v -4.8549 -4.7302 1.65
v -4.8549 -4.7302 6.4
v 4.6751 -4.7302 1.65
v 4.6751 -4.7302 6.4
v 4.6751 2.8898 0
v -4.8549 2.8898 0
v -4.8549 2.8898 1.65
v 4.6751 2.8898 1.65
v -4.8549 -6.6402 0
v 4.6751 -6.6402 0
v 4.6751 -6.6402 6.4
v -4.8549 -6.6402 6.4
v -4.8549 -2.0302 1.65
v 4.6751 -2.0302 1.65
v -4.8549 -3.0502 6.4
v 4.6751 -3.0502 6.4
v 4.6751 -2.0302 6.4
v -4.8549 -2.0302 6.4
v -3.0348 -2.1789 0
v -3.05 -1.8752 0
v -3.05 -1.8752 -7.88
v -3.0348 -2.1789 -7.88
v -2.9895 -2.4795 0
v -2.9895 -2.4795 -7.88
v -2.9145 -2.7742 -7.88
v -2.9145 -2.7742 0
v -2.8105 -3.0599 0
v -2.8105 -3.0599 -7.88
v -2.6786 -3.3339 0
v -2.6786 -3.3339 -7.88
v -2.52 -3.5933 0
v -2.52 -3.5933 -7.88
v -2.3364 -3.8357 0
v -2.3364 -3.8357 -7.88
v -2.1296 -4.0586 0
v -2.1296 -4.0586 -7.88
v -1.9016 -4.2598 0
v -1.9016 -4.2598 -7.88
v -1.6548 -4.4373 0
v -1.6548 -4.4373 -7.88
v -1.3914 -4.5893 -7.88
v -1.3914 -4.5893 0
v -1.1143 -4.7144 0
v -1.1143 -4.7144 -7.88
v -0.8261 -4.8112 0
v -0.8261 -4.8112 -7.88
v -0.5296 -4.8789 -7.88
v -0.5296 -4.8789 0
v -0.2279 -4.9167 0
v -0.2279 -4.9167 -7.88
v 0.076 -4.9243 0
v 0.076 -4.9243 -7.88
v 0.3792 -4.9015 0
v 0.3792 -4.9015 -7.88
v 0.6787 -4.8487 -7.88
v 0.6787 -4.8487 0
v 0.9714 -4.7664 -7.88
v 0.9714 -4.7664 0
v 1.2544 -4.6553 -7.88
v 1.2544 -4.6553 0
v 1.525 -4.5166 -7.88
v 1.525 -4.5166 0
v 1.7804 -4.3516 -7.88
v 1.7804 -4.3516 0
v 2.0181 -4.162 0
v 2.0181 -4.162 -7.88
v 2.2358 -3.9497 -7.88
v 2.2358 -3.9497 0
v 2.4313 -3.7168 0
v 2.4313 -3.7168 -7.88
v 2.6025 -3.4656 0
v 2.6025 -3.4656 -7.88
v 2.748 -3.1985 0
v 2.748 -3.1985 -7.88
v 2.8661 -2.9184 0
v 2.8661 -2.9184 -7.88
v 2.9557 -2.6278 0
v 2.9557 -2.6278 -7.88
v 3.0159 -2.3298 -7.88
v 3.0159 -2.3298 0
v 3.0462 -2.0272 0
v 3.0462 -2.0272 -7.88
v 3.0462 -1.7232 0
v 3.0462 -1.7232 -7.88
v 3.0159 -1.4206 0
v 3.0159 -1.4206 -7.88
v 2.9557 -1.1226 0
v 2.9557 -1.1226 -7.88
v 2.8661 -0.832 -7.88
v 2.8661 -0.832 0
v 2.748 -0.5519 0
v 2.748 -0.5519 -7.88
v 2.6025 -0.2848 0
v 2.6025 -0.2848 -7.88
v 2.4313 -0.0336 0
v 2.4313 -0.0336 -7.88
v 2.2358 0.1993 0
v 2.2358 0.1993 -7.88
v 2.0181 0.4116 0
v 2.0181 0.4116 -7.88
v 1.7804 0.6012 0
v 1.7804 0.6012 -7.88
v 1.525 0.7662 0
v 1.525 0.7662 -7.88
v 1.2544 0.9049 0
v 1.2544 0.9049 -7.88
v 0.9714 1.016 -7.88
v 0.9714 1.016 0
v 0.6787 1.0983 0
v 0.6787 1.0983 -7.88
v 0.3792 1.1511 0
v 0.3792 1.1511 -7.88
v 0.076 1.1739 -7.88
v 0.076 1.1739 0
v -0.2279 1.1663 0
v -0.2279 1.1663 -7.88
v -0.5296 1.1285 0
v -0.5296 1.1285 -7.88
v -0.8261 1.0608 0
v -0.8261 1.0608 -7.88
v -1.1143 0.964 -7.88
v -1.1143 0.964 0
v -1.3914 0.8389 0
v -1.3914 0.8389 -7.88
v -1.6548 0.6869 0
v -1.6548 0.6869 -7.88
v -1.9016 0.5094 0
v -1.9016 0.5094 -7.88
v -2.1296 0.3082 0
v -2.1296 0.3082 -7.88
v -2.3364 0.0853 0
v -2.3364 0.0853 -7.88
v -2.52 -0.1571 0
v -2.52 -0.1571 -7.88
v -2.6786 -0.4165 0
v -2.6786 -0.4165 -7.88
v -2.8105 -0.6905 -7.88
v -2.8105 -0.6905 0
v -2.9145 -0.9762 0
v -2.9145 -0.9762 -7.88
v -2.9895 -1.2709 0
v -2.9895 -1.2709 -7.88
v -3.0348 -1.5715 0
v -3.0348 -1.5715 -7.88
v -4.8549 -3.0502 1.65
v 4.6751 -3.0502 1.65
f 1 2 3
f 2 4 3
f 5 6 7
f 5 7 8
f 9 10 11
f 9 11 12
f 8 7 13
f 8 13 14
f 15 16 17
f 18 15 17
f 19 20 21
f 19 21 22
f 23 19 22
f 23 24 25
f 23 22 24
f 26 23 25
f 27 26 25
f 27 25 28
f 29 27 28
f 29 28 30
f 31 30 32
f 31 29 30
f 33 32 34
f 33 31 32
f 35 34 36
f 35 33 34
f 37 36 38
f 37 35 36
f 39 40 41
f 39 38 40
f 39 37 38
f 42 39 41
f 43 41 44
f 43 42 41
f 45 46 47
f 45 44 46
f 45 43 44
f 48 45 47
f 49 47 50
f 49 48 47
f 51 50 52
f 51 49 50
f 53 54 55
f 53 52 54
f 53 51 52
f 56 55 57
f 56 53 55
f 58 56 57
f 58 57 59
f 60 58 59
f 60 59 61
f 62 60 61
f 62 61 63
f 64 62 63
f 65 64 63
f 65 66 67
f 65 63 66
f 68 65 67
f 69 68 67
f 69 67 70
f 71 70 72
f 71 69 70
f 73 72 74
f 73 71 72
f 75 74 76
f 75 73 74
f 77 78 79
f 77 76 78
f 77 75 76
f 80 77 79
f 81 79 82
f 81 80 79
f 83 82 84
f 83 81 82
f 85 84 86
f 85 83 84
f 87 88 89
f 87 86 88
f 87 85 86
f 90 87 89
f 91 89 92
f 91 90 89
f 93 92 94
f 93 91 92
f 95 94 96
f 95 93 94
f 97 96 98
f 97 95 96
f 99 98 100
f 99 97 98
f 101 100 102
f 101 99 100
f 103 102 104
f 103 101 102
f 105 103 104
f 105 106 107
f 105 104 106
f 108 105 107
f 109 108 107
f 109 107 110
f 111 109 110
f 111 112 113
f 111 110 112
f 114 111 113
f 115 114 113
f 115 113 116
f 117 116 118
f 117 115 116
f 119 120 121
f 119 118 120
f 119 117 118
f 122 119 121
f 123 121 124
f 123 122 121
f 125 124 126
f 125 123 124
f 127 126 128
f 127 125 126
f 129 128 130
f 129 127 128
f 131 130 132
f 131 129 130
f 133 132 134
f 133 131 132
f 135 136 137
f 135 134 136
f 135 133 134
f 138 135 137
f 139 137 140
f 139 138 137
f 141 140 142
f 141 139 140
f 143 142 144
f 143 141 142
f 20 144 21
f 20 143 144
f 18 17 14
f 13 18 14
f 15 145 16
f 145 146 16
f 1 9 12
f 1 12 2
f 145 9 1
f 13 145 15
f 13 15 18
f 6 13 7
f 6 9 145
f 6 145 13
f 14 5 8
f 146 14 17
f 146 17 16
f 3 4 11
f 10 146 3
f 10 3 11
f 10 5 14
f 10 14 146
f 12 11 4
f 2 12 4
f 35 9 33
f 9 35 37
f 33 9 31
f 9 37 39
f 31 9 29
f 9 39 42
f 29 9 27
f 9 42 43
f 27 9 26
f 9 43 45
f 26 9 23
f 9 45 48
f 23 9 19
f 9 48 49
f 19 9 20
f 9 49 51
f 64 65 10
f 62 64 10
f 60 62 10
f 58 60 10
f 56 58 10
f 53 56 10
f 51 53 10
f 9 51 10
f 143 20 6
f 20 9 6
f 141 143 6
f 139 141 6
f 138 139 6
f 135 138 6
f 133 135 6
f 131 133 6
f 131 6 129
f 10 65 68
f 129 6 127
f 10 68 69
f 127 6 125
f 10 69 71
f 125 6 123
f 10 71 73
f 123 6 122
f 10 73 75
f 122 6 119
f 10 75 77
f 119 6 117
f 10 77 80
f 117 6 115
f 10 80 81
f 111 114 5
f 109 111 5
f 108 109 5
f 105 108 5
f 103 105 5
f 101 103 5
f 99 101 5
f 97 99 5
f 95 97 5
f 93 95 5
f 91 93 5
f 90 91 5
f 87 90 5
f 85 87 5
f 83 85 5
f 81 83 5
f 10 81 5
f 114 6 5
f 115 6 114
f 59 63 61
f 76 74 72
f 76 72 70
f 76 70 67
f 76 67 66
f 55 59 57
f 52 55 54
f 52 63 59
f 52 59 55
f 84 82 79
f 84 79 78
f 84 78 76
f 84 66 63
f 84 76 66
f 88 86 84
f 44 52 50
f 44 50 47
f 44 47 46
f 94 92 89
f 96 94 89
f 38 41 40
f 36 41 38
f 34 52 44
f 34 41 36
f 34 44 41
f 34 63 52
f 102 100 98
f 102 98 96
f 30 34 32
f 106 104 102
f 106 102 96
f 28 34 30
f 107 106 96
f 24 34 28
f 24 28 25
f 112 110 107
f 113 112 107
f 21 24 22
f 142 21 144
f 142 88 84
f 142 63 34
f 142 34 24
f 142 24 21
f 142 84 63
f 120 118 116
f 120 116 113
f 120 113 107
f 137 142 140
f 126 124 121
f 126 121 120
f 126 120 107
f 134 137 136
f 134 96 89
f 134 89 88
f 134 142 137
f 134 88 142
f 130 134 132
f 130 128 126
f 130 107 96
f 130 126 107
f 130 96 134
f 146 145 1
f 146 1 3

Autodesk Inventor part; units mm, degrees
ref_plane "YZ Plane" through (0, 0, 0) normal (1, 0, 0) x (0, 1, 0)
ref_plane "XZ Plane" through (0, 0, 0) normal (0, 1, 0) x (-1, 0, 0)
ref_plane "XY Plane" through (0, 0, 0) normal (0, 0, 1) x (1, 0, 0)
sketch "Sketch1" plane through (0, 0, 0) normal (0, 0, 1) x (1, 0, 0)
  line L0 (-4.8549, 2.8898) -> (4.6751, 2.8898)
  line L1 (4.6751, 2.8898) -> (4.6751, -6.6402)
  line L2 (4.6751, -6.6402) -> (-4.8549, -6.6402)
  line L3 (-4.8549, -6.6402) -> (-4.8549, 2.8898)
  point P0 (0, 0)
  dimension "d0" = 9.53
  dimension "d1" = 9.53
extrude "Extrusion1" add sketch "Sketch1" along normal blind 1.65
sketch "Sketch2" plane through (4.6751, -6.6402, 0) normal (1, 0, 0) x (0, 0, -1)
  line L0 (-1.65, 0) -> (-1.65, 9.53) projected
  line L1 (-1.65, 3.59) -> (-6.4, 3.59)
  line L2 (-6.4, 3.59) -> (-6.4, 4.61)
  line L3 (-6.4, 4.61) -> (-1.65, 4.61)
  line L4 (-1.65, 4.61) -> (-1.65, 3.59)
  line L5 (-1.65, 0) -> (-6.4, 0)
  line L6 (-6.4, 0) -> (-6.4, 1.91)
  line L7 (-6.4, 1.91) -> (-1.65, 1.91)
  line L8 (-1.65, 1.91) -> (-1.65, 0)
  point P0 (0, 6.6402)
  dimension "d4" = 1.68
  dimension "d5" = 1.91
  dimension "d6" = 1.02
  dimension "d7" = 4.75
  dimension "d8" = 4.75
extrude "Extrusion2" add sketch "Sketch2" against normal blind 9.53
sketch "Sketch3" plane through (0, 0, 0) normal (0, 0, -1) x (-1, 0, 0)
  circle A0 centre (0, -1.8752) radius 3.05
  point P0 (0, 0)
  dimension "d11" = 6.1
extrude "Extrusion3" add sketch "Sketch3" along normal blind 7.88
properties part number "SMA_Edge"
